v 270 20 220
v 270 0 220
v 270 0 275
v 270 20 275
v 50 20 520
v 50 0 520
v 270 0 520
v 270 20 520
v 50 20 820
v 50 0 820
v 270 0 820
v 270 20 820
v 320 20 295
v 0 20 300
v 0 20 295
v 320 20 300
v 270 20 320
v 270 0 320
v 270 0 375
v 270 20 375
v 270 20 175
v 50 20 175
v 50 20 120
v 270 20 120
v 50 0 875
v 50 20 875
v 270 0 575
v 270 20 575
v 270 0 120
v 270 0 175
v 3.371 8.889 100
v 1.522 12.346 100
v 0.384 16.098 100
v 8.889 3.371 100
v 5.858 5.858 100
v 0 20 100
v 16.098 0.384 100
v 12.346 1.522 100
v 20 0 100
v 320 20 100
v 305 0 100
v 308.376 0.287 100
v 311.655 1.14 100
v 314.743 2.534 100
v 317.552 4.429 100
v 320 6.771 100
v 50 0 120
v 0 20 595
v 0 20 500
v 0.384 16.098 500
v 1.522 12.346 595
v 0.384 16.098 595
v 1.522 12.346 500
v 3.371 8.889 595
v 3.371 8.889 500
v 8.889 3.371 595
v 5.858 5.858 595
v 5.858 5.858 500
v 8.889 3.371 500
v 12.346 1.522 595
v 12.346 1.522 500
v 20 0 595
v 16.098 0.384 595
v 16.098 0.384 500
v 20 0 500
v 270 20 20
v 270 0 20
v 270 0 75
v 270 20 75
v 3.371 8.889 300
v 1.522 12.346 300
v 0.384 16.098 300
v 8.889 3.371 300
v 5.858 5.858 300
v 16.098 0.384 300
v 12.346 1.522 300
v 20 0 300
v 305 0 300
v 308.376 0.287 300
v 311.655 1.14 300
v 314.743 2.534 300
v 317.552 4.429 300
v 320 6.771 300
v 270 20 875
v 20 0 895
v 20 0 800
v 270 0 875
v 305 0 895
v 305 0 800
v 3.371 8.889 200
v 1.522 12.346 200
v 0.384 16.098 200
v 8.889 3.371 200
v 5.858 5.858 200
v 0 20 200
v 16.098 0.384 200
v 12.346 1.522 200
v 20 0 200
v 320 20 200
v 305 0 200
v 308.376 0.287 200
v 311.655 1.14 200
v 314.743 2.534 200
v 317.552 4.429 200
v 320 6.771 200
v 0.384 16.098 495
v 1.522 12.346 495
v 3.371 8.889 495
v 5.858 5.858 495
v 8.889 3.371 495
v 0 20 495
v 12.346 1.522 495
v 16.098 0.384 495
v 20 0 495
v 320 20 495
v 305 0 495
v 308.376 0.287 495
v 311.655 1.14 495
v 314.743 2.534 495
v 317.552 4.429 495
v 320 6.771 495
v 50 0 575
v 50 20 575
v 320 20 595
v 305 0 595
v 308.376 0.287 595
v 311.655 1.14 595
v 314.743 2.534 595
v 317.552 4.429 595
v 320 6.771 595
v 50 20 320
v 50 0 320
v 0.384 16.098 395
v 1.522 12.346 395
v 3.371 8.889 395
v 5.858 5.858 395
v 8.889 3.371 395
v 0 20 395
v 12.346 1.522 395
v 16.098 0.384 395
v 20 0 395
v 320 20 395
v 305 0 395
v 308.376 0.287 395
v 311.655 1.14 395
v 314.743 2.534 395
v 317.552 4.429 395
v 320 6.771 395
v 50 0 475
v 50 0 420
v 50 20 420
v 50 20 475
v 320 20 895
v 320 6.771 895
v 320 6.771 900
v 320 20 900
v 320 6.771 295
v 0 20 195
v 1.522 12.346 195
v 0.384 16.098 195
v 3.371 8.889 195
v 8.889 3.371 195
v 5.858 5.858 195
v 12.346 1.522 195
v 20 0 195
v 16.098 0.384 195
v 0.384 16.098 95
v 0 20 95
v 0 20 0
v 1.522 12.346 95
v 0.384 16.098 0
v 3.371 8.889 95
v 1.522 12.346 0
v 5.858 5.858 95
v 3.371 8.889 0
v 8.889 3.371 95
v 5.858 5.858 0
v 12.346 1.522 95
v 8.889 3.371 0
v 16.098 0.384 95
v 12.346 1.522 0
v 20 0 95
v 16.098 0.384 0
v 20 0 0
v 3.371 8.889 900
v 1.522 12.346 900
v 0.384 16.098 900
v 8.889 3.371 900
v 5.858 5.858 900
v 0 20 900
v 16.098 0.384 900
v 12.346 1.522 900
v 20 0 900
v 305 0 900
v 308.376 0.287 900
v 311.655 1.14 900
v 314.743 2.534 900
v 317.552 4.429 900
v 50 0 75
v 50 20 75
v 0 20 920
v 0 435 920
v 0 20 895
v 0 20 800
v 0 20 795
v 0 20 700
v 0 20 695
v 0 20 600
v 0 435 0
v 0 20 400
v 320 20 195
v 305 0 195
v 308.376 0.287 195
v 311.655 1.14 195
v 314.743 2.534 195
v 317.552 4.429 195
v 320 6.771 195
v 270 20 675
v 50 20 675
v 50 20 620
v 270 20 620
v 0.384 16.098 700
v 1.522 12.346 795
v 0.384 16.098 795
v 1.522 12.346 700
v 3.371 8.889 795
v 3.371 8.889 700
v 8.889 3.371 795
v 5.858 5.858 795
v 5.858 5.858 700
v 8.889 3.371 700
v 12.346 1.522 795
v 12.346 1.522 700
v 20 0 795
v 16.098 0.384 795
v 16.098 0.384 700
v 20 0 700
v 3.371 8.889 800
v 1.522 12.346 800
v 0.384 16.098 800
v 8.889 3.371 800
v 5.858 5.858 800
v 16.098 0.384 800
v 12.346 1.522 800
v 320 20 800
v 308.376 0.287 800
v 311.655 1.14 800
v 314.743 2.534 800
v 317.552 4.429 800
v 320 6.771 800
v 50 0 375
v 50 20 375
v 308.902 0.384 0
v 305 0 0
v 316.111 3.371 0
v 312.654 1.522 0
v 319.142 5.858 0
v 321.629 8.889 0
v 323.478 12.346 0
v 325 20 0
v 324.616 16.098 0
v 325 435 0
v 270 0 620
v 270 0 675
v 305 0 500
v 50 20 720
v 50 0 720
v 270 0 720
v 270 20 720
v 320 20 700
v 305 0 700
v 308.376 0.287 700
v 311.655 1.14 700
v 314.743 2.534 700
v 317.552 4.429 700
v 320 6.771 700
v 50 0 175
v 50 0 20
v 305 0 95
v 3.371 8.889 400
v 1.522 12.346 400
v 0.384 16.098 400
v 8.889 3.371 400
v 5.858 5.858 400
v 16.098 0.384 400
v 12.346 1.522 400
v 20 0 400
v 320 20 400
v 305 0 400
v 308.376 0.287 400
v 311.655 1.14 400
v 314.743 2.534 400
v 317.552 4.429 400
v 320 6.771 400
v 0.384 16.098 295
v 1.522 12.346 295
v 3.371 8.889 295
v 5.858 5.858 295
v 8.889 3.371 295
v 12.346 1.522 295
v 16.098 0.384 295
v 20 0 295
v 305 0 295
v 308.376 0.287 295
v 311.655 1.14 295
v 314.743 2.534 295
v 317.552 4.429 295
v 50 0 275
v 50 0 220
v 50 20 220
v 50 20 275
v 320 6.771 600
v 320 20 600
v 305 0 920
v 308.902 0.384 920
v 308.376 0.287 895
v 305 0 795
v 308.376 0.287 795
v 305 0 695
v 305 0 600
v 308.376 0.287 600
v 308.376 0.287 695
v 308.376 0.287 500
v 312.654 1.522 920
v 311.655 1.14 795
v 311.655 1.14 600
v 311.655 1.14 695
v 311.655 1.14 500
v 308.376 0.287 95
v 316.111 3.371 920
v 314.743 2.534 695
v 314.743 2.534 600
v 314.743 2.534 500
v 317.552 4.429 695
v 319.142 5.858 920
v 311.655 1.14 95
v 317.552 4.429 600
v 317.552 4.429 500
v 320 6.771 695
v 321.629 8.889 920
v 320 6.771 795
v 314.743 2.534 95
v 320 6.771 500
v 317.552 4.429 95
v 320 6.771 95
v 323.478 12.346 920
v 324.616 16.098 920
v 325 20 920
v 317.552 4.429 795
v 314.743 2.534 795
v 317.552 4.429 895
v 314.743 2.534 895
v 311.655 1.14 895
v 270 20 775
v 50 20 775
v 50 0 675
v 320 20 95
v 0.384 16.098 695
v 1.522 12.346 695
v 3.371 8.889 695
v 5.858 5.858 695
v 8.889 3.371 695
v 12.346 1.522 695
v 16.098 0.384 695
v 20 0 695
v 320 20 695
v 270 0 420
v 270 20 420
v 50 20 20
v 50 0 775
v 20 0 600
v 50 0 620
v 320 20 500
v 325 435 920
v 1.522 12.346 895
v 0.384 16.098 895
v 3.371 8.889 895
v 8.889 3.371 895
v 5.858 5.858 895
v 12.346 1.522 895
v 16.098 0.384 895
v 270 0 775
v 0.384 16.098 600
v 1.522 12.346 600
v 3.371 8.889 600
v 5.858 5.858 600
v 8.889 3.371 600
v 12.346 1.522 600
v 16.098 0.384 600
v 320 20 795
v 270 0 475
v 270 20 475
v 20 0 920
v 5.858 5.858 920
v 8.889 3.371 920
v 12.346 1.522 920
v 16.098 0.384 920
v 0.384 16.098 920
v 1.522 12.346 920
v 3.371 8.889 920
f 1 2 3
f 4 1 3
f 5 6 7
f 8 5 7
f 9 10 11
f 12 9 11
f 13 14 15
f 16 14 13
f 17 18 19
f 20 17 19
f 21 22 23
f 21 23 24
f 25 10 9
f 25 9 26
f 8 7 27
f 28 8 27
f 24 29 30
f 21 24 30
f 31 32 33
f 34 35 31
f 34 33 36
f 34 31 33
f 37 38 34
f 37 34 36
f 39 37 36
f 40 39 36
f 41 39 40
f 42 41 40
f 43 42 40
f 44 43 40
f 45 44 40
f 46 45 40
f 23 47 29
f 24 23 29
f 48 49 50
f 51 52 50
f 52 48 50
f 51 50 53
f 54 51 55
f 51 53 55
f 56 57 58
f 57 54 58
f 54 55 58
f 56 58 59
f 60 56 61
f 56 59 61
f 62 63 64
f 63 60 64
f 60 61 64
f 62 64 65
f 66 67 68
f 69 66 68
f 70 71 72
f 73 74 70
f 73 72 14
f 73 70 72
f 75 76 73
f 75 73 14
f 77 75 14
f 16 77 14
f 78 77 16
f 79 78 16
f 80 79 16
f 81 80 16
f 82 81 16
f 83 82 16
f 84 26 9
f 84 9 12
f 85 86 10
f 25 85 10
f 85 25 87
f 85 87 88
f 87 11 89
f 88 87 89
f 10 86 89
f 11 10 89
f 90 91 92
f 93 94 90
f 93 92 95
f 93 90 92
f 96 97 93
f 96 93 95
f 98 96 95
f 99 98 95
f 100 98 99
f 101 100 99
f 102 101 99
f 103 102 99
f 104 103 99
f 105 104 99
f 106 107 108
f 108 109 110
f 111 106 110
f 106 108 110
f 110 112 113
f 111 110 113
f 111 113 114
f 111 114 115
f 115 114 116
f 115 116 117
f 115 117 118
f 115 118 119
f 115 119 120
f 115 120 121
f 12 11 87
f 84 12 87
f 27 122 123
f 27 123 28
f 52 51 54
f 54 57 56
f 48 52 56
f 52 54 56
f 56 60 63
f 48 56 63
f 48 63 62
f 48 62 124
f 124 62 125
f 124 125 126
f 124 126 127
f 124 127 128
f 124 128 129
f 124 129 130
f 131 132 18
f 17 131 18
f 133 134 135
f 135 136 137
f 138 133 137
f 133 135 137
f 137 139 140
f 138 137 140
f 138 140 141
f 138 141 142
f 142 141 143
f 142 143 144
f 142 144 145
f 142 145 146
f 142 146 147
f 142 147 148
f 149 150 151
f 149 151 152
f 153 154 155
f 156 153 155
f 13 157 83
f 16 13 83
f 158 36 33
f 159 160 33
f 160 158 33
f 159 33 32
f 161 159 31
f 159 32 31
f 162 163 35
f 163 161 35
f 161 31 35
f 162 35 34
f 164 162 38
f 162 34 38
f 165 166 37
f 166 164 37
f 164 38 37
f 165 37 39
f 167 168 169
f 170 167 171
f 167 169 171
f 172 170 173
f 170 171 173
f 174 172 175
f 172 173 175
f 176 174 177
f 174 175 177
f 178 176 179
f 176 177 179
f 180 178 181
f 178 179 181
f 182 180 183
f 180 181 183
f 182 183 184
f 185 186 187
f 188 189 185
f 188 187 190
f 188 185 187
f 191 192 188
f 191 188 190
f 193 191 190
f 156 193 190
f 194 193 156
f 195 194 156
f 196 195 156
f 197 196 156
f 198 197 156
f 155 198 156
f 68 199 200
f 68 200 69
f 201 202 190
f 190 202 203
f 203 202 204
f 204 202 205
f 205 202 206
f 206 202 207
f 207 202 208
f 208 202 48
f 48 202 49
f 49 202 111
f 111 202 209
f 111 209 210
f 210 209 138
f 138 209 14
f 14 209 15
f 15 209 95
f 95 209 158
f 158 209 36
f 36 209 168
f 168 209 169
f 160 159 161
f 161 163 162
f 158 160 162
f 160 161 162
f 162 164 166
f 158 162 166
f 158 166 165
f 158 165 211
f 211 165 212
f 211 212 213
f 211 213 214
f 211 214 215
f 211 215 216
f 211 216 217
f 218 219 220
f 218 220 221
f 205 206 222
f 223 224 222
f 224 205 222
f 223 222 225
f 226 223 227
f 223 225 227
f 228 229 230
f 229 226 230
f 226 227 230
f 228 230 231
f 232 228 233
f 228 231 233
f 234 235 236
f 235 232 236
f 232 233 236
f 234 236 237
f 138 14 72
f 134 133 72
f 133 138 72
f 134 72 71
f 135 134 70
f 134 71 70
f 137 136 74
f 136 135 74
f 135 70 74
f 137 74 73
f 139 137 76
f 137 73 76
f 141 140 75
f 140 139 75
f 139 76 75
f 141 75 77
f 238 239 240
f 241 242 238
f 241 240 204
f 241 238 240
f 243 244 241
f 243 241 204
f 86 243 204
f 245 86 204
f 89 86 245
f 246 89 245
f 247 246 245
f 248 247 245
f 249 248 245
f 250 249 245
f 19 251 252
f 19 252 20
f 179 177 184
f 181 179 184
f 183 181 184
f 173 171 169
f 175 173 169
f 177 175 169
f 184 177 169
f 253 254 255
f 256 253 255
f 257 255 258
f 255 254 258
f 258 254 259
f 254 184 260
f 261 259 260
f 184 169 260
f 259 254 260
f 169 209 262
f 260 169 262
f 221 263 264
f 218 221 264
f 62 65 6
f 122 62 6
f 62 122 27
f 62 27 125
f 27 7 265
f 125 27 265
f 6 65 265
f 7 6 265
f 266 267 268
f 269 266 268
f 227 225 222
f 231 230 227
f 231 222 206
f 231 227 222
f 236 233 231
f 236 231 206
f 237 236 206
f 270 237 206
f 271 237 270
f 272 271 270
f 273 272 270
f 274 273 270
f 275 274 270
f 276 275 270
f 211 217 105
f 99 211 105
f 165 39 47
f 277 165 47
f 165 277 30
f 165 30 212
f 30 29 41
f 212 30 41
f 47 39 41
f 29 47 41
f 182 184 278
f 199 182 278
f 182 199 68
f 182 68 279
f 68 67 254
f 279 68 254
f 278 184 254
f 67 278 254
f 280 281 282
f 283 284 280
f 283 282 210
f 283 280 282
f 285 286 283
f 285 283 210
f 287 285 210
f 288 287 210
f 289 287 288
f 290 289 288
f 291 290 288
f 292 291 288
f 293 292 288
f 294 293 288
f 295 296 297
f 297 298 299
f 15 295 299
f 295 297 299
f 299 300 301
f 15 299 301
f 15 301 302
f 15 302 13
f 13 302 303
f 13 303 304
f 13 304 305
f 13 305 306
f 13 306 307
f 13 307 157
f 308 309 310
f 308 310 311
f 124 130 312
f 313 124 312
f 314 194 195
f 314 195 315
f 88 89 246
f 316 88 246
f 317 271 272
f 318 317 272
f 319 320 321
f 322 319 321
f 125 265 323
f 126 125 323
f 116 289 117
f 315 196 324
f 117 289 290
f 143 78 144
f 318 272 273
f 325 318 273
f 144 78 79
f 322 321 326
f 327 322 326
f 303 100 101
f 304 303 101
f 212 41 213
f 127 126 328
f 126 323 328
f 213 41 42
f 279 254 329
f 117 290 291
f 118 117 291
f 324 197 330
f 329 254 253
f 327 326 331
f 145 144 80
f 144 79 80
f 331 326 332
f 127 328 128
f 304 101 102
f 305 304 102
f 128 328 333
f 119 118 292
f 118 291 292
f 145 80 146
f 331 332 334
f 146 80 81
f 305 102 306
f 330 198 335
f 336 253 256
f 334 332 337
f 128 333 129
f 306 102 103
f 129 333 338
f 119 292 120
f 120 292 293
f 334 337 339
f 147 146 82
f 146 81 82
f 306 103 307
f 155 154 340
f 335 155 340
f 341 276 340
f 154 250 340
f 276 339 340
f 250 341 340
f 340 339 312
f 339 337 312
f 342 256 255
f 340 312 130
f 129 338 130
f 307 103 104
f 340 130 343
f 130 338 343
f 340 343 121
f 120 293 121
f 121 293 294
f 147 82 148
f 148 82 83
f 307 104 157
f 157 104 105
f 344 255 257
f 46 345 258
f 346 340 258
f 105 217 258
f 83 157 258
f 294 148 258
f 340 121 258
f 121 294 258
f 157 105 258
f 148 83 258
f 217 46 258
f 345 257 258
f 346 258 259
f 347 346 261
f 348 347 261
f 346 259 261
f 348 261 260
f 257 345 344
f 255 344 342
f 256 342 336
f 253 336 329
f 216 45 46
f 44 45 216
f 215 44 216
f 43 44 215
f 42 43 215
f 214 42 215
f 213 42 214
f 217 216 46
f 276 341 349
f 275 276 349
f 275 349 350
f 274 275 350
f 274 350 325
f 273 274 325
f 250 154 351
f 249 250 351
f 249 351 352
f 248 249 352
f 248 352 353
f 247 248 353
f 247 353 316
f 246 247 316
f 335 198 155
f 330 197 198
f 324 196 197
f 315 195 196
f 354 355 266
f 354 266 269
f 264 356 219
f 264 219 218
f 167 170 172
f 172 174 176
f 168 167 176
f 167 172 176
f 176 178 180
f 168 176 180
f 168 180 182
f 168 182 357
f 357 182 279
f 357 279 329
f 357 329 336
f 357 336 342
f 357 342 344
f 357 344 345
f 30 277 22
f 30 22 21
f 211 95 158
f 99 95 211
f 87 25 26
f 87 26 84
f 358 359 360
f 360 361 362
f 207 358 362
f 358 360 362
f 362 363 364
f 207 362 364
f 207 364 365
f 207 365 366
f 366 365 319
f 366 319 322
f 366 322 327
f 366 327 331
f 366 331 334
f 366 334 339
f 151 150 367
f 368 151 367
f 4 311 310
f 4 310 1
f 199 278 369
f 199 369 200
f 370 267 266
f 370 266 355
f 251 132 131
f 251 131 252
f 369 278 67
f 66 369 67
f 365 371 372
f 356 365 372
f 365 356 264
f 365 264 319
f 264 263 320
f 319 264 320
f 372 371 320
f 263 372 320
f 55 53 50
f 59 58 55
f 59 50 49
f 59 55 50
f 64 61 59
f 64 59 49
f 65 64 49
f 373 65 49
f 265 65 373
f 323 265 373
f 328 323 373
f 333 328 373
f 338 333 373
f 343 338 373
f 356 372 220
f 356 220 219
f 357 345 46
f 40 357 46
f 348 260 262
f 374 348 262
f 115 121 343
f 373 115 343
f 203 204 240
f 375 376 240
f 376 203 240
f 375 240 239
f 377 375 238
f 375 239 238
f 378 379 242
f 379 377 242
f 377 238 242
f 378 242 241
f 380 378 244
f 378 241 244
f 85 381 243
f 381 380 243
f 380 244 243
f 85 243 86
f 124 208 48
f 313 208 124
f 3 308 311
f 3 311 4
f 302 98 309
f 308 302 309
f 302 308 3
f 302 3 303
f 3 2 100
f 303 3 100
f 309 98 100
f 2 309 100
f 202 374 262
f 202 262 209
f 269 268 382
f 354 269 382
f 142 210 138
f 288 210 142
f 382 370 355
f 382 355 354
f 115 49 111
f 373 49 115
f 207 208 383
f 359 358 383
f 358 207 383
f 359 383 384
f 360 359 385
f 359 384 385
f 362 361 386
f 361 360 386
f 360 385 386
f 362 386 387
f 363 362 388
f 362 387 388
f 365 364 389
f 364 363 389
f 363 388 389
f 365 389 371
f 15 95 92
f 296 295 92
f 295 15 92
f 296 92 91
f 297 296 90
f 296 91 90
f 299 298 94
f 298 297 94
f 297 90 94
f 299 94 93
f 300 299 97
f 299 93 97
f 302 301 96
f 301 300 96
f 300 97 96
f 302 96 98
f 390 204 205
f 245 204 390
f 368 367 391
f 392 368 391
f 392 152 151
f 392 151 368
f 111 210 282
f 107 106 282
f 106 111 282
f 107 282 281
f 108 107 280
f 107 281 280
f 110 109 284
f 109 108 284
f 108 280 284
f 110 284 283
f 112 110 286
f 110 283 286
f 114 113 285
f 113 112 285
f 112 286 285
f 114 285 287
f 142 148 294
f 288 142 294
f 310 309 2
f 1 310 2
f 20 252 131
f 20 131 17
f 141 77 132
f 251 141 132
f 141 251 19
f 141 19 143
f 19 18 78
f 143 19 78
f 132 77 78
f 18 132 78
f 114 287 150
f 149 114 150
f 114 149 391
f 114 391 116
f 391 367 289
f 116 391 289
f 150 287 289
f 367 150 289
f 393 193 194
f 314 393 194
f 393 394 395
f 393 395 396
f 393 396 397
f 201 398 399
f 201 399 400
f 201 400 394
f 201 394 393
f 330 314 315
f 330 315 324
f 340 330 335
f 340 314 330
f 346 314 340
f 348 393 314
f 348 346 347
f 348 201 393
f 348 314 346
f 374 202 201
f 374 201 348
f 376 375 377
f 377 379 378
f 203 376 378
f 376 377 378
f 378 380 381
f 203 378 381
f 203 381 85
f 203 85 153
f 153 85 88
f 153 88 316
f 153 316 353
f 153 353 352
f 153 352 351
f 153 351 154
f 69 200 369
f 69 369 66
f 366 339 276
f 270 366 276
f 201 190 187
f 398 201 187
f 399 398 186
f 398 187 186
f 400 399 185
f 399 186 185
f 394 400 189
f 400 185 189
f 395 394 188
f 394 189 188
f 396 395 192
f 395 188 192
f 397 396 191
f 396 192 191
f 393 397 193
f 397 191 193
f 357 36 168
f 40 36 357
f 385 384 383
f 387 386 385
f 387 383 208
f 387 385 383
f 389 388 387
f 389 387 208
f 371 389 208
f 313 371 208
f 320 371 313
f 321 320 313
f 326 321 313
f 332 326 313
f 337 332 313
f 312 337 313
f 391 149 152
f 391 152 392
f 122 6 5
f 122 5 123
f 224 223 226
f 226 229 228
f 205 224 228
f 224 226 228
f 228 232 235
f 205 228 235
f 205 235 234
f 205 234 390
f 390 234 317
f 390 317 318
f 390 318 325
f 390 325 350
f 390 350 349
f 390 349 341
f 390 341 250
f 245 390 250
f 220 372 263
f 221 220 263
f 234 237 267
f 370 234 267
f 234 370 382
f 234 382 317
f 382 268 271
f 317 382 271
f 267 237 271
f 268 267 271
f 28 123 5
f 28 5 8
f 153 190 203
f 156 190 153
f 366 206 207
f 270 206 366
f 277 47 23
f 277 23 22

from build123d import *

# Parameters (mm, degrees)
PAD009_DEPTH        = 920
SKETCH017_W         = 220
SKETCH017_H         = 55
SKETCH017_W_2       = 320
SKETCH017_H_2       = 5
POCKET002_DEPTH     = 20
LINEARPATTERN_COUNT = 9
LINEARPATTERN_PITCH = 100


with BuildPart() as part:
    # Sketch016 → Pad009 (new body)
    with BuildSketch(Plane.XY):
        with BuildLine():
            Line((20, 0), (305, 0))
            ThreePointArc((305, 0), (319.142136, 5.857864), (325, 20))
            Line((325, 20), (325, 435))
            Line((325, 435), (0, 435))
            Line((0, 435), (0, 20))
            ThreePointArc((0, 20), (5.857864, 5.857864), (20, 0))
        make_face()
    extrude(amount=PAD009_DEPTH)

    # Sketch017 → Pocket002 (cut)
    with BuildSketch(Plane.XZ):
        with Locations((160, 47.5)):
            Rectangle(SKETCH017_W, SKETCH017_H)
        with Locations((160, 97.5)):
            Rectangle(SKETCH017_W_2, SKETCH017_H_2)
    pocket002 = extrude(amount=-POCKET002_DEPTH, mode=Mode.SUBTRACT)

    # LinearPattern: Pocket002 ×9
    with Locations(*[(0, 0, i * LINEARPATTERN_PITCH) for i in range(1, LINEARPATTERN_COUNT)]):
        add(pocket002, mode=Mode.SUBTRACT)


solid = part.part
